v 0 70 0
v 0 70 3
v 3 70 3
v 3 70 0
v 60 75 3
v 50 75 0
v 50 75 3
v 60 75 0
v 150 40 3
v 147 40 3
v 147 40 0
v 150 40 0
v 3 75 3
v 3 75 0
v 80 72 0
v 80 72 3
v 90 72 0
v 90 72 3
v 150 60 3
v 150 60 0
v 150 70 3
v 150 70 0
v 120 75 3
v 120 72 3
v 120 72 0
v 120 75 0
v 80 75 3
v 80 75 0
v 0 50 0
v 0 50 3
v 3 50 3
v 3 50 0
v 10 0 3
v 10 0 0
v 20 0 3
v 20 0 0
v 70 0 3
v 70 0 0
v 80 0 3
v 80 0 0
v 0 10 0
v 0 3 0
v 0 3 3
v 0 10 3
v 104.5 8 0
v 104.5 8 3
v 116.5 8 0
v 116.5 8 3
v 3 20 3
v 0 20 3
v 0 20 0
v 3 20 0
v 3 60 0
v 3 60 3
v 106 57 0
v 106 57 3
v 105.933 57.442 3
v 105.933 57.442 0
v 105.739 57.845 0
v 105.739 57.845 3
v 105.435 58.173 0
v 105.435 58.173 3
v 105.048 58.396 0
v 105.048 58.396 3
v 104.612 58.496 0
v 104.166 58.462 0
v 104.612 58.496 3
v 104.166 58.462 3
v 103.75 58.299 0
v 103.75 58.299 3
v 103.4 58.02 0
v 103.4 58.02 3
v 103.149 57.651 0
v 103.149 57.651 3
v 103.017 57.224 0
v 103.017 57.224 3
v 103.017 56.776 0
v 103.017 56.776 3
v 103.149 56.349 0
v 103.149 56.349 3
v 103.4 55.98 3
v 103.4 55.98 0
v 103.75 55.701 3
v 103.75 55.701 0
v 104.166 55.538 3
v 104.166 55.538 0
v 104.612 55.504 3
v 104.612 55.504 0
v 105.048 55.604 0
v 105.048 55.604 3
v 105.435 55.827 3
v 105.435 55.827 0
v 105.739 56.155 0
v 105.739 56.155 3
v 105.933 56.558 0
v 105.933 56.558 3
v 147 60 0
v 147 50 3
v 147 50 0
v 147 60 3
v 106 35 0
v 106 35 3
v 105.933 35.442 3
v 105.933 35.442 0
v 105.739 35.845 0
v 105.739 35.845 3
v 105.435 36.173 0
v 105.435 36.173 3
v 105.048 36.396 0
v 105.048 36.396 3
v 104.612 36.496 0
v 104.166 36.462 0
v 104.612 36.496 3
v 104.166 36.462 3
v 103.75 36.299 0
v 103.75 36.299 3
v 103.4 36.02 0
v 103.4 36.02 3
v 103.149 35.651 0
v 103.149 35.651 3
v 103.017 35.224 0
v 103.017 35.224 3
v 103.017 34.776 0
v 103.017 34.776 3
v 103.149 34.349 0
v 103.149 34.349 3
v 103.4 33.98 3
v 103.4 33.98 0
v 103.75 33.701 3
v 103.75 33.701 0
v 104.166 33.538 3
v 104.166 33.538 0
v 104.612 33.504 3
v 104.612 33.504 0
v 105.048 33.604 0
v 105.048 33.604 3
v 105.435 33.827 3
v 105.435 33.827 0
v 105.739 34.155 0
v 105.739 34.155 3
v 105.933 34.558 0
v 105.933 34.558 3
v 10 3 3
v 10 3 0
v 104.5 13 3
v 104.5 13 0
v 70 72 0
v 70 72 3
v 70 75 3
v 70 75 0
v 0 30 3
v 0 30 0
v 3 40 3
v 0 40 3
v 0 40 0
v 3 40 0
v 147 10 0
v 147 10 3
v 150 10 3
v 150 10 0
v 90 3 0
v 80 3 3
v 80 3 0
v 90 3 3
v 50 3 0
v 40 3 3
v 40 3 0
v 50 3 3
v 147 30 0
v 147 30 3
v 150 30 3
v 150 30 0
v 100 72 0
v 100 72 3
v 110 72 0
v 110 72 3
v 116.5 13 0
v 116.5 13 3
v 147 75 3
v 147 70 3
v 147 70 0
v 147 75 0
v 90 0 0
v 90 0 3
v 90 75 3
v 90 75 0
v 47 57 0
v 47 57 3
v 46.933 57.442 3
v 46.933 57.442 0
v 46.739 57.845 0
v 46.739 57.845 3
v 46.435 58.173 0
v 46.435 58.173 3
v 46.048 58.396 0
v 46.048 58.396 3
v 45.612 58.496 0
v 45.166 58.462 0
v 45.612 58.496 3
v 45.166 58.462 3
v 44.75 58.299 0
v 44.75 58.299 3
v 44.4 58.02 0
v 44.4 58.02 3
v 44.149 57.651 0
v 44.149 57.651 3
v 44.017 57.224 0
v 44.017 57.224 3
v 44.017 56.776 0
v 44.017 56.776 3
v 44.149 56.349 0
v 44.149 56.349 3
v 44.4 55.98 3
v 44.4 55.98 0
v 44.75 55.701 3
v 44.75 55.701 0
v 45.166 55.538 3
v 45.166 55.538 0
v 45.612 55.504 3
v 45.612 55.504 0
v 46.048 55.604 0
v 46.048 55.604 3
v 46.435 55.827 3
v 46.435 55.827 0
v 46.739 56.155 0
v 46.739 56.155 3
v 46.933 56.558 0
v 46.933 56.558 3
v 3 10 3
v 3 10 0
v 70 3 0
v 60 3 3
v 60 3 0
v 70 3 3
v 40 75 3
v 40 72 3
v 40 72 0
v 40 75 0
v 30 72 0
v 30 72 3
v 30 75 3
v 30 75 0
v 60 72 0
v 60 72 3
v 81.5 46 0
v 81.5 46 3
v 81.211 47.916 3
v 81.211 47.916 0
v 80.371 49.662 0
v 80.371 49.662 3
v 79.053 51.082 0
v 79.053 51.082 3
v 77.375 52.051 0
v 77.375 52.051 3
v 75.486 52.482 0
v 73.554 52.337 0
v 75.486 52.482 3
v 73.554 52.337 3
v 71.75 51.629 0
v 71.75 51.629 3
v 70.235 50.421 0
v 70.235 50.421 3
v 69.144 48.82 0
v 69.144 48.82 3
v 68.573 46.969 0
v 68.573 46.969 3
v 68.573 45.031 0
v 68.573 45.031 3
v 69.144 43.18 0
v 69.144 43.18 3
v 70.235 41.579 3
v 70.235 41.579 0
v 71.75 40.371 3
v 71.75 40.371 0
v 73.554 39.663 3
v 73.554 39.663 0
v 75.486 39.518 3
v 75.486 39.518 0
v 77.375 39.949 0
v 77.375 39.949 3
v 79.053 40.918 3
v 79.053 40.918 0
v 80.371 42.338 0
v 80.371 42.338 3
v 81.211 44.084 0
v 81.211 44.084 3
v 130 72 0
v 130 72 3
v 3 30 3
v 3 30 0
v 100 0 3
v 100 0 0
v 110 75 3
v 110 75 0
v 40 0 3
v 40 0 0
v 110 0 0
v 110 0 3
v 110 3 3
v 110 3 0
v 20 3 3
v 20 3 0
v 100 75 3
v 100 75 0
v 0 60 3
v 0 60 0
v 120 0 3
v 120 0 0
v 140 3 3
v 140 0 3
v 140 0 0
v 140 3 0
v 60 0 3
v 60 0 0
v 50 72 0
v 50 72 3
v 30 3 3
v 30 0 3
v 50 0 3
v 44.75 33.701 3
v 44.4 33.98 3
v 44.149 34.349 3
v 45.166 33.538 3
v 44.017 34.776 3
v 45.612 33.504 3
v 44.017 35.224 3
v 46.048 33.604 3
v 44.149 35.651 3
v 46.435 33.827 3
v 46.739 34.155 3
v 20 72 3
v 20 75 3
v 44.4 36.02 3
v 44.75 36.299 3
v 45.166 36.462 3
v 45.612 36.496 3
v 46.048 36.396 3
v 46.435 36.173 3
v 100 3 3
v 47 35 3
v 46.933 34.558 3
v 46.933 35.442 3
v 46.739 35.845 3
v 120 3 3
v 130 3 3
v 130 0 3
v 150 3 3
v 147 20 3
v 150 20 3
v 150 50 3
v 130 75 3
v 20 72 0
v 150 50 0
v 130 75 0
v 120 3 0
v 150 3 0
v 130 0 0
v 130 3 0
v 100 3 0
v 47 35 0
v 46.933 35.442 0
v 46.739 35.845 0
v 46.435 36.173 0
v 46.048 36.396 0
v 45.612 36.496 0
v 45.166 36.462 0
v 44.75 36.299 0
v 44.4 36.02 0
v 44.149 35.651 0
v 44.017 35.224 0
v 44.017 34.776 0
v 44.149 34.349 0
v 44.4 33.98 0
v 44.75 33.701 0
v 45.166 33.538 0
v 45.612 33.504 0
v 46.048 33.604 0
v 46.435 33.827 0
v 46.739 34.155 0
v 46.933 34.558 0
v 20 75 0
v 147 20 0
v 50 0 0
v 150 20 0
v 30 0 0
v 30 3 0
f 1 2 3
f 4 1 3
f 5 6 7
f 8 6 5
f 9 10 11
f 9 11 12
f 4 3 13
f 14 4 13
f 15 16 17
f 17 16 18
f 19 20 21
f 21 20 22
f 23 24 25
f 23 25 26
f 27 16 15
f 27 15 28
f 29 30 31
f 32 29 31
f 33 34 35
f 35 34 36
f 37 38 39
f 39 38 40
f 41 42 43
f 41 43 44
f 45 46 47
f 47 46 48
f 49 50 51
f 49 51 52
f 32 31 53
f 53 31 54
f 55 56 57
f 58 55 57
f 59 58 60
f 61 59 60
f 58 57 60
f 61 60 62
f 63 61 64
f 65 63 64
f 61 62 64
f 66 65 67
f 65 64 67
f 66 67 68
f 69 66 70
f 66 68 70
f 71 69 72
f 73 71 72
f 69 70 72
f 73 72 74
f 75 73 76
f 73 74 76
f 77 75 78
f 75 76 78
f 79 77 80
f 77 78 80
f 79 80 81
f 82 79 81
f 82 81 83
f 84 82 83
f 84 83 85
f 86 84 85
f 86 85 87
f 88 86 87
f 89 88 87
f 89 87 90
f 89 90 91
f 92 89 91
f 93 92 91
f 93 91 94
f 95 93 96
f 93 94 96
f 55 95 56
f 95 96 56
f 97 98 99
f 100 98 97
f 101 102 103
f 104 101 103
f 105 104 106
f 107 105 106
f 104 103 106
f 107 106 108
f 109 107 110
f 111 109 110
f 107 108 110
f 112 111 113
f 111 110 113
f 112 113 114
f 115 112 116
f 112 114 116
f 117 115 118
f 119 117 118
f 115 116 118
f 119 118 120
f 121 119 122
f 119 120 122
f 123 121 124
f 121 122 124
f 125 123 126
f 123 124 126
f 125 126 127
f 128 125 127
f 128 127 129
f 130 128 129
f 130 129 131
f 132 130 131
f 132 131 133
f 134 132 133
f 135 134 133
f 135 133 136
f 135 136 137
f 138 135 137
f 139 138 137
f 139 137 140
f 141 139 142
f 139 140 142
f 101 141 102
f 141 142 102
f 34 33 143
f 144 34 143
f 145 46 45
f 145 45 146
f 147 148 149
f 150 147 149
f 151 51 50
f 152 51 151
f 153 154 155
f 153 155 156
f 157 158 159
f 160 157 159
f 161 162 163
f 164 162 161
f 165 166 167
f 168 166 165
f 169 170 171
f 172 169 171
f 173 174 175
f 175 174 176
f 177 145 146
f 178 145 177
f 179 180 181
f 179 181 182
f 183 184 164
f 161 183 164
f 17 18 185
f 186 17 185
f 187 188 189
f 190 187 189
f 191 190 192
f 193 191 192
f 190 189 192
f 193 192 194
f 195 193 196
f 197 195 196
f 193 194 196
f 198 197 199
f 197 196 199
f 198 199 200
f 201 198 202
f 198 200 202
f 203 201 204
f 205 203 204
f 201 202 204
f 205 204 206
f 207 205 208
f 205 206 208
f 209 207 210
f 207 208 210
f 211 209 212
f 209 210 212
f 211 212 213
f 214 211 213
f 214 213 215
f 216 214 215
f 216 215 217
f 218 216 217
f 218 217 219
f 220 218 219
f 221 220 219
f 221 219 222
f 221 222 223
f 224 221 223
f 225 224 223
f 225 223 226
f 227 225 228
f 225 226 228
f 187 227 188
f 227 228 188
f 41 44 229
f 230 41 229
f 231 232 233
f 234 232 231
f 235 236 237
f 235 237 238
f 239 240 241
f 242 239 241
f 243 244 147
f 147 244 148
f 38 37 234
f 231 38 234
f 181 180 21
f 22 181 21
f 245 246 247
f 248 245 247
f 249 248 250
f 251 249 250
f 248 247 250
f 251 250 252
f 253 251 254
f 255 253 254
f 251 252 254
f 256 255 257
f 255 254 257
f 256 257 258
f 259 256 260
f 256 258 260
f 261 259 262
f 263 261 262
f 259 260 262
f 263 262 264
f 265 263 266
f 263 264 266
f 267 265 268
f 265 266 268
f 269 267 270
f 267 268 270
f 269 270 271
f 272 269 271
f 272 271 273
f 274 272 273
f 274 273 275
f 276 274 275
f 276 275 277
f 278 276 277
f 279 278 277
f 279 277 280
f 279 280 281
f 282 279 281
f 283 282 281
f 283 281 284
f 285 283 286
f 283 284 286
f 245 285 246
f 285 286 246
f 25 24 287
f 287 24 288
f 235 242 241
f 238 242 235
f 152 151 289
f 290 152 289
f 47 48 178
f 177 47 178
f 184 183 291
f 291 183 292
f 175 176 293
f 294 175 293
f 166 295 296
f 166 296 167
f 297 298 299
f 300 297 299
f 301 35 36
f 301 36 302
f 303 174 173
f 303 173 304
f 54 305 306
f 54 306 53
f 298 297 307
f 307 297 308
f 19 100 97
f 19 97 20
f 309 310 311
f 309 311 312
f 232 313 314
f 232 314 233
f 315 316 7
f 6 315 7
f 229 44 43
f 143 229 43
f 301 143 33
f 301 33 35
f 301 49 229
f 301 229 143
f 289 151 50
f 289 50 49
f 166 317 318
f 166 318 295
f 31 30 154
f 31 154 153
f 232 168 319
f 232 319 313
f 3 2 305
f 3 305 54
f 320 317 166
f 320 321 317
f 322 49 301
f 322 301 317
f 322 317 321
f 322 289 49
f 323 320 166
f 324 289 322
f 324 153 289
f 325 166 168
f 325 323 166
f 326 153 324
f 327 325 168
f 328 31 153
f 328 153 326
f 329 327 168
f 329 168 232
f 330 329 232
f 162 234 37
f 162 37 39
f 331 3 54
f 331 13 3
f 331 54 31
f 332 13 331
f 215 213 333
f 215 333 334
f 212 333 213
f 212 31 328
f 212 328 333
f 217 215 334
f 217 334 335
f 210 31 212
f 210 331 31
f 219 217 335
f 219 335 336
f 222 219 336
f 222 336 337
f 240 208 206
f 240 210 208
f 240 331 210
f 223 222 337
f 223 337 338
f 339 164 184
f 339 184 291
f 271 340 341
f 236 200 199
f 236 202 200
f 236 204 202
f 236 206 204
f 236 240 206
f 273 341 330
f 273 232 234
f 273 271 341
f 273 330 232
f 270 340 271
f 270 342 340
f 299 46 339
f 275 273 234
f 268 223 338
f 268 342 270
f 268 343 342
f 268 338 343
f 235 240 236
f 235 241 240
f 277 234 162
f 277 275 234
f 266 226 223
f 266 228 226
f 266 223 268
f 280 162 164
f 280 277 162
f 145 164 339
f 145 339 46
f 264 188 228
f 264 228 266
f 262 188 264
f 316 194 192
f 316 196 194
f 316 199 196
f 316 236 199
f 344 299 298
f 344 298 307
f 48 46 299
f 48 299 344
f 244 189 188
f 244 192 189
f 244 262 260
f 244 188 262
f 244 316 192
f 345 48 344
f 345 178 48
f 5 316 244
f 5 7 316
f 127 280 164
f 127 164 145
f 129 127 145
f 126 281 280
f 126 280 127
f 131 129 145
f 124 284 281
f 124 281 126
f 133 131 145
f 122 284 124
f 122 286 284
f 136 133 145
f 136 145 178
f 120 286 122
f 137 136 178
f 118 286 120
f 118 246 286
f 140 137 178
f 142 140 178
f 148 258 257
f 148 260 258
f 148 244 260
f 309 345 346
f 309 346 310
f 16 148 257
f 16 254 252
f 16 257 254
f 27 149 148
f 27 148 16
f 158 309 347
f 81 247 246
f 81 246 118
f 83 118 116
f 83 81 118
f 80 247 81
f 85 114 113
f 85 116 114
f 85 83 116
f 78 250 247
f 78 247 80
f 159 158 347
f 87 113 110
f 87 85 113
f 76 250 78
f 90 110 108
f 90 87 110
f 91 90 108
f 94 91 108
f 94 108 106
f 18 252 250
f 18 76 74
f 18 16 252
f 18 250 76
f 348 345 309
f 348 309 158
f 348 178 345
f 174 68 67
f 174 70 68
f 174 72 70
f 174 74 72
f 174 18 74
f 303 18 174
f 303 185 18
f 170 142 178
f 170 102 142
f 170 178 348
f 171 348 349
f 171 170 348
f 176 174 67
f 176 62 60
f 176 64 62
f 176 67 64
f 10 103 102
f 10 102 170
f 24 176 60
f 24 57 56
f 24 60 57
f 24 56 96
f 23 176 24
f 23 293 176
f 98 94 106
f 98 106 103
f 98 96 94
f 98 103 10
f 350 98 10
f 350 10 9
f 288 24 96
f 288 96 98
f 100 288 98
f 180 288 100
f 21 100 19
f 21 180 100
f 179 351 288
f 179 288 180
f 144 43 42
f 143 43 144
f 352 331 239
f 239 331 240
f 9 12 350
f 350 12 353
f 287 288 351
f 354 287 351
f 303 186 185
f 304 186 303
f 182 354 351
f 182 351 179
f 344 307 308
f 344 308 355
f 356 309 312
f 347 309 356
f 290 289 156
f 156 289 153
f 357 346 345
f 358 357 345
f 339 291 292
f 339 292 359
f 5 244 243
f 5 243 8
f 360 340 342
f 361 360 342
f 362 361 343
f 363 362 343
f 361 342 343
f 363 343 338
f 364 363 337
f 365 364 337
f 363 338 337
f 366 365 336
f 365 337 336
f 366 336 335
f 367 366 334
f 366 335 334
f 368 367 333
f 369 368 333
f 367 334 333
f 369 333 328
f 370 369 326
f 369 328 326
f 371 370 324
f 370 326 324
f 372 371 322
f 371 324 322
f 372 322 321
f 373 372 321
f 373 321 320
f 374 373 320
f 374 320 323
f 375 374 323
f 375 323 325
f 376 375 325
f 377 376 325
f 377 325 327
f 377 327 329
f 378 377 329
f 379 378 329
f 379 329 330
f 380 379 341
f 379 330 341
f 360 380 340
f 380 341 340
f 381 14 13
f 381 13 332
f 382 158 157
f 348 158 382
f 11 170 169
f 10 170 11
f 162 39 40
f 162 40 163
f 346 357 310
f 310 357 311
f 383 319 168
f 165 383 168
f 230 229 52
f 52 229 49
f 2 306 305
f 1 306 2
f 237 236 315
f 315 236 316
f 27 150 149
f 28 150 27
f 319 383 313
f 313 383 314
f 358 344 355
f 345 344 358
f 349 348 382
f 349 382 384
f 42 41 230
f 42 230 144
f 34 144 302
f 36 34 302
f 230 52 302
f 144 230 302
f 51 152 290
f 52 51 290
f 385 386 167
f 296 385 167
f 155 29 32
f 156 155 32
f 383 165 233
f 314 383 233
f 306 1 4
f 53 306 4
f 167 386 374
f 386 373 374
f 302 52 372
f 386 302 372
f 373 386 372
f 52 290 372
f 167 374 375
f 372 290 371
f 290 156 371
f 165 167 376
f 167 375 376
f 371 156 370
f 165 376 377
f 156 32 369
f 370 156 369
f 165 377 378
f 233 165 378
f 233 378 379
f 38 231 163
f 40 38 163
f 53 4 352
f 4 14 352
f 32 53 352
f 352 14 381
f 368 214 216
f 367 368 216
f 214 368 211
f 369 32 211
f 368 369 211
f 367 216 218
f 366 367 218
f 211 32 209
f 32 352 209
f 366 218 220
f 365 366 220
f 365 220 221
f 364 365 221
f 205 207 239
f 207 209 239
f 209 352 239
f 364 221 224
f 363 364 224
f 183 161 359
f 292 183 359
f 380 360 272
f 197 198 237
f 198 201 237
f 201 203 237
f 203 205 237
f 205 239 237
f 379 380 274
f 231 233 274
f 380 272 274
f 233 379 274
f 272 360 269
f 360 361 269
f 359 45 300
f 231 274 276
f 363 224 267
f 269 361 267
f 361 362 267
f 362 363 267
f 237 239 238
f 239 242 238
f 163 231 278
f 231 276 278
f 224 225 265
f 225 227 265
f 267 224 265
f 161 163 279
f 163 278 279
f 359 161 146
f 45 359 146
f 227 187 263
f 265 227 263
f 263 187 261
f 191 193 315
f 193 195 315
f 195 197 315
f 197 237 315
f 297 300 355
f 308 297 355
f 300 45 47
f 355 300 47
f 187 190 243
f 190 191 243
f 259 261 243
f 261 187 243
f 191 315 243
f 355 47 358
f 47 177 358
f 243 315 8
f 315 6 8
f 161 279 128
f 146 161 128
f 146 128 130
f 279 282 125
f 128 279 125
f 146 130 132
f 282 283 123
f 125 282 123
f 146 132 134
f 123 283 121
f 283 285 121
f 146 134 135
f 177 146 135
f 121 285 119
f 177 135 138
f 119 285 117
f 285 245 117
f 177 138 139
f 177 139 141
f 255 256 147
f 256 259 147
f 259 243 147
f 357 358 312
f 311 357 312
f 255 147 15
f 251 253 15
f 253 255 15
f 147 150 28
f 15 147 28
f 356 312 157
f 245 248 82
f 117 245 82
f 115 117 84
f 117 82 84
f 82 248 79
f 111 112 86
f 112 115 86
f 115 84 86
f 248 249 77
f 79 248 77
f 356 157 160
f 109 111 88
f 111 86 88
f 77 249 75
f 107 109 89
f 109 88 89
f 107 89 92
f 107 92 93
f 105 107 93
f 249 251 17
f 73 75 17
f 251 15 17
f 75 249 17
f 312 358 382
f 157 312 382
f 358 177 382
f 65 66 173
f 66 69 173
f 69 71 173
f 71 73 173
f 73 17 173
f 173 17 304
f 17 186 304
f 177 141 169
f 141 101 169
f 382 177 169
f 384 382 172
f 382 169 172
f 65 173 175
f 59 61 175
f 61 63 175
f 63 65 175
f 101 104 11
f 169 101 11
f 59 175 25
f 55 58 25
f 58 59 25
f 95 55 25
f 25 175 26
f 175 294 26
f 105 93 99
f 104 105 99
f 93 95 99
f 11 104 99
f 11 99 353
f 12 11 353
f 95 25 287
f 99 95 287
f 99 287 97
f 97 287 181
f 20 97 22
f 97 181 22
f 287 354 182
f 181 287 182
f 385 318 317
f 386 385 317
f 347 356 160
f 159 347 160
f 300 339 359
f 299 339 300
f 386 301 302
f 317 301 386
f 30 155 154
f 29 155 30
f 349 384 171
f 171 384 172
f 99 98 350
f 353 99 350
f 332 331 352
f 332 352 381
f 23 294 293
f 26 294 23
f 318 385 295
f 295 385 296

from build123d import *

# Parameters (mm, degrees)
MDFESB_W          = 150
MDFESB_H          = 75
MDF_DEPTH         = 3
ENCAIXESESB_W     = 10
ENCAIXESESB_H     = 3
ENCAIXESESB_W_2   = 3
ENCAIXESESB_H_2   = 10
ENCAIXES_DEPTH    = 3
MOTORPASSOESB_R   = 1.5
MOTORPASSOESB_R_2 = 6.5
MOTORPASSOESB_W   = 12
MOTORPASSOESB_H   = 5
MOTORPASSO_DEPTH  = 3


with BuildPart() as part:
    # mdfEsb → mdf (new body)
    with BuildSketch(Plane.XY):
        with Locations((75, 37.5)):
            Rectangle(MDFESB_W, MDFESB_H)
    extrude(amount=MDF_DEPTH)

    # EncaixesEsb → Encaixes (cut)
    with BuildSketch(Plane.XY.offset(3)):
        with Locations((25, 1.5)):
            Rectangle(ENCAIXESESB_W, ENCAIXESESB_H)
        with Locations((5, 1.5)):
            Rectangle(ENCAIXESESB_W, ENCAIXESESB_H)
        with Locations((45, 1.5)):
            Rectangle(ENCAIXESESB_W, ENCAIXESESB_H)
        with Locations((65, 1.5)):
            Rectangle(ENCAIXESESB_W, ENCAIXESESB_H)
        with Locations((85, 1.5)):
            Rectangle(ENCAIXESESB_W, ENCAIXESESB_H)
        with Locations((105, 1.5)):
            Rectangle(ENCAIXESESB_W, ENCAIXESESB_H)
        with Locations((125, 1.5)):
            Rectangle(ENCAIXESESB_W, ENCAIXESESB_H)
        with Locations((145, 1.5)):
            Rectangle(ENCAIXESESB_W, ENCAIXESESB_H)
        with Locations((1.5, 15)):
            Rectangle(ENCAIXESESB_W_2, ENCAIXESESB_H_2)
        with Locations((148.5, 15)):
            Rectangle(ENCAIXESESB_W_2, ENCAIXESESB_H_2)
        with Locations((148.5, 35)):
            Rectangle(ENCAIXESESB_W_2, ENCAIXESESB_H_2)
        with Locations((148.5, 55)):
            Rectangle(ENCAIXESESB_W_2, ENCAIXESESB_H_2)
        with Locations((148.5, 75)):
            Rectangle(ENCAIXESESB_W_2, ENCAIXESESB_H_2)
        with Locations((1.5, 35)):
            Rectangle(ENCAIXESESB_W_2, ENCAIXESESB_H_2)
        with Locations((1.5, 55)):
            Rectangle(ENCAIXESESB_W_2, ENCAIXESESB_H_2)
        with Locations((1.5, 75)):
            Rectangle(ENCAIXESESB_W_2, ENCAIXESESB_H_2)
        with Locations((25, 73.5)):
            Rectangle(ENCAIXESESB_W, ENCAIXESESB_H)
        with Locations((45, 73.5)):
            Rectangle(ENCAIXESESB_W, ENCAIXESESB_H)
        with Locations((65, 73.5)):
            Rectangle(ENCAIXESESB_W, ENCAIXESESB_H)
        with Locations((85, 73.5)):
            Rectangle(ENCAIXESESB_W, ENCAIXESESB_H)
        with Locations((105, 73.5)):
            Rectangle(ENCAIXESESB_W, ENCAIXESESB_H)
        with Locations((125, 73.5)):
            Rectangle(ENCAIXESESB_W, ENCAIXESESB_H)
    extrude(amount=-ENCAIXES_DEPTH, mode=Mode.SUBTRACT)

    # motorPassoEsb → motorPasso (cut)
    with BuildSketch(Plane.XY.offset(3)):
        with Locations((45.5, 35)):
            Circle(MOTORPASSOESB_R)
        with Locations((104.5, 35)):
            Circle(MOTORPASSOESB_R)
        with Locations((104.5, 57)):
            Circle(MOTORPASSOESB_R)
        with Locations((45.5, 57)):
            Circle(MOTORPASSOESB_R)
        with Locations((75, 46)):
            Circle(MOTORPASSOESB_R_2)
        with Locations((110.5, 10.5)):
            Rectangle(MOTORPASSOESB_W, MOTORPASSOESB_H)
    extrude(amount=-MOTORPASSO_DEPTH, mode=Mode.SUBTRACT)


solid = part.part
